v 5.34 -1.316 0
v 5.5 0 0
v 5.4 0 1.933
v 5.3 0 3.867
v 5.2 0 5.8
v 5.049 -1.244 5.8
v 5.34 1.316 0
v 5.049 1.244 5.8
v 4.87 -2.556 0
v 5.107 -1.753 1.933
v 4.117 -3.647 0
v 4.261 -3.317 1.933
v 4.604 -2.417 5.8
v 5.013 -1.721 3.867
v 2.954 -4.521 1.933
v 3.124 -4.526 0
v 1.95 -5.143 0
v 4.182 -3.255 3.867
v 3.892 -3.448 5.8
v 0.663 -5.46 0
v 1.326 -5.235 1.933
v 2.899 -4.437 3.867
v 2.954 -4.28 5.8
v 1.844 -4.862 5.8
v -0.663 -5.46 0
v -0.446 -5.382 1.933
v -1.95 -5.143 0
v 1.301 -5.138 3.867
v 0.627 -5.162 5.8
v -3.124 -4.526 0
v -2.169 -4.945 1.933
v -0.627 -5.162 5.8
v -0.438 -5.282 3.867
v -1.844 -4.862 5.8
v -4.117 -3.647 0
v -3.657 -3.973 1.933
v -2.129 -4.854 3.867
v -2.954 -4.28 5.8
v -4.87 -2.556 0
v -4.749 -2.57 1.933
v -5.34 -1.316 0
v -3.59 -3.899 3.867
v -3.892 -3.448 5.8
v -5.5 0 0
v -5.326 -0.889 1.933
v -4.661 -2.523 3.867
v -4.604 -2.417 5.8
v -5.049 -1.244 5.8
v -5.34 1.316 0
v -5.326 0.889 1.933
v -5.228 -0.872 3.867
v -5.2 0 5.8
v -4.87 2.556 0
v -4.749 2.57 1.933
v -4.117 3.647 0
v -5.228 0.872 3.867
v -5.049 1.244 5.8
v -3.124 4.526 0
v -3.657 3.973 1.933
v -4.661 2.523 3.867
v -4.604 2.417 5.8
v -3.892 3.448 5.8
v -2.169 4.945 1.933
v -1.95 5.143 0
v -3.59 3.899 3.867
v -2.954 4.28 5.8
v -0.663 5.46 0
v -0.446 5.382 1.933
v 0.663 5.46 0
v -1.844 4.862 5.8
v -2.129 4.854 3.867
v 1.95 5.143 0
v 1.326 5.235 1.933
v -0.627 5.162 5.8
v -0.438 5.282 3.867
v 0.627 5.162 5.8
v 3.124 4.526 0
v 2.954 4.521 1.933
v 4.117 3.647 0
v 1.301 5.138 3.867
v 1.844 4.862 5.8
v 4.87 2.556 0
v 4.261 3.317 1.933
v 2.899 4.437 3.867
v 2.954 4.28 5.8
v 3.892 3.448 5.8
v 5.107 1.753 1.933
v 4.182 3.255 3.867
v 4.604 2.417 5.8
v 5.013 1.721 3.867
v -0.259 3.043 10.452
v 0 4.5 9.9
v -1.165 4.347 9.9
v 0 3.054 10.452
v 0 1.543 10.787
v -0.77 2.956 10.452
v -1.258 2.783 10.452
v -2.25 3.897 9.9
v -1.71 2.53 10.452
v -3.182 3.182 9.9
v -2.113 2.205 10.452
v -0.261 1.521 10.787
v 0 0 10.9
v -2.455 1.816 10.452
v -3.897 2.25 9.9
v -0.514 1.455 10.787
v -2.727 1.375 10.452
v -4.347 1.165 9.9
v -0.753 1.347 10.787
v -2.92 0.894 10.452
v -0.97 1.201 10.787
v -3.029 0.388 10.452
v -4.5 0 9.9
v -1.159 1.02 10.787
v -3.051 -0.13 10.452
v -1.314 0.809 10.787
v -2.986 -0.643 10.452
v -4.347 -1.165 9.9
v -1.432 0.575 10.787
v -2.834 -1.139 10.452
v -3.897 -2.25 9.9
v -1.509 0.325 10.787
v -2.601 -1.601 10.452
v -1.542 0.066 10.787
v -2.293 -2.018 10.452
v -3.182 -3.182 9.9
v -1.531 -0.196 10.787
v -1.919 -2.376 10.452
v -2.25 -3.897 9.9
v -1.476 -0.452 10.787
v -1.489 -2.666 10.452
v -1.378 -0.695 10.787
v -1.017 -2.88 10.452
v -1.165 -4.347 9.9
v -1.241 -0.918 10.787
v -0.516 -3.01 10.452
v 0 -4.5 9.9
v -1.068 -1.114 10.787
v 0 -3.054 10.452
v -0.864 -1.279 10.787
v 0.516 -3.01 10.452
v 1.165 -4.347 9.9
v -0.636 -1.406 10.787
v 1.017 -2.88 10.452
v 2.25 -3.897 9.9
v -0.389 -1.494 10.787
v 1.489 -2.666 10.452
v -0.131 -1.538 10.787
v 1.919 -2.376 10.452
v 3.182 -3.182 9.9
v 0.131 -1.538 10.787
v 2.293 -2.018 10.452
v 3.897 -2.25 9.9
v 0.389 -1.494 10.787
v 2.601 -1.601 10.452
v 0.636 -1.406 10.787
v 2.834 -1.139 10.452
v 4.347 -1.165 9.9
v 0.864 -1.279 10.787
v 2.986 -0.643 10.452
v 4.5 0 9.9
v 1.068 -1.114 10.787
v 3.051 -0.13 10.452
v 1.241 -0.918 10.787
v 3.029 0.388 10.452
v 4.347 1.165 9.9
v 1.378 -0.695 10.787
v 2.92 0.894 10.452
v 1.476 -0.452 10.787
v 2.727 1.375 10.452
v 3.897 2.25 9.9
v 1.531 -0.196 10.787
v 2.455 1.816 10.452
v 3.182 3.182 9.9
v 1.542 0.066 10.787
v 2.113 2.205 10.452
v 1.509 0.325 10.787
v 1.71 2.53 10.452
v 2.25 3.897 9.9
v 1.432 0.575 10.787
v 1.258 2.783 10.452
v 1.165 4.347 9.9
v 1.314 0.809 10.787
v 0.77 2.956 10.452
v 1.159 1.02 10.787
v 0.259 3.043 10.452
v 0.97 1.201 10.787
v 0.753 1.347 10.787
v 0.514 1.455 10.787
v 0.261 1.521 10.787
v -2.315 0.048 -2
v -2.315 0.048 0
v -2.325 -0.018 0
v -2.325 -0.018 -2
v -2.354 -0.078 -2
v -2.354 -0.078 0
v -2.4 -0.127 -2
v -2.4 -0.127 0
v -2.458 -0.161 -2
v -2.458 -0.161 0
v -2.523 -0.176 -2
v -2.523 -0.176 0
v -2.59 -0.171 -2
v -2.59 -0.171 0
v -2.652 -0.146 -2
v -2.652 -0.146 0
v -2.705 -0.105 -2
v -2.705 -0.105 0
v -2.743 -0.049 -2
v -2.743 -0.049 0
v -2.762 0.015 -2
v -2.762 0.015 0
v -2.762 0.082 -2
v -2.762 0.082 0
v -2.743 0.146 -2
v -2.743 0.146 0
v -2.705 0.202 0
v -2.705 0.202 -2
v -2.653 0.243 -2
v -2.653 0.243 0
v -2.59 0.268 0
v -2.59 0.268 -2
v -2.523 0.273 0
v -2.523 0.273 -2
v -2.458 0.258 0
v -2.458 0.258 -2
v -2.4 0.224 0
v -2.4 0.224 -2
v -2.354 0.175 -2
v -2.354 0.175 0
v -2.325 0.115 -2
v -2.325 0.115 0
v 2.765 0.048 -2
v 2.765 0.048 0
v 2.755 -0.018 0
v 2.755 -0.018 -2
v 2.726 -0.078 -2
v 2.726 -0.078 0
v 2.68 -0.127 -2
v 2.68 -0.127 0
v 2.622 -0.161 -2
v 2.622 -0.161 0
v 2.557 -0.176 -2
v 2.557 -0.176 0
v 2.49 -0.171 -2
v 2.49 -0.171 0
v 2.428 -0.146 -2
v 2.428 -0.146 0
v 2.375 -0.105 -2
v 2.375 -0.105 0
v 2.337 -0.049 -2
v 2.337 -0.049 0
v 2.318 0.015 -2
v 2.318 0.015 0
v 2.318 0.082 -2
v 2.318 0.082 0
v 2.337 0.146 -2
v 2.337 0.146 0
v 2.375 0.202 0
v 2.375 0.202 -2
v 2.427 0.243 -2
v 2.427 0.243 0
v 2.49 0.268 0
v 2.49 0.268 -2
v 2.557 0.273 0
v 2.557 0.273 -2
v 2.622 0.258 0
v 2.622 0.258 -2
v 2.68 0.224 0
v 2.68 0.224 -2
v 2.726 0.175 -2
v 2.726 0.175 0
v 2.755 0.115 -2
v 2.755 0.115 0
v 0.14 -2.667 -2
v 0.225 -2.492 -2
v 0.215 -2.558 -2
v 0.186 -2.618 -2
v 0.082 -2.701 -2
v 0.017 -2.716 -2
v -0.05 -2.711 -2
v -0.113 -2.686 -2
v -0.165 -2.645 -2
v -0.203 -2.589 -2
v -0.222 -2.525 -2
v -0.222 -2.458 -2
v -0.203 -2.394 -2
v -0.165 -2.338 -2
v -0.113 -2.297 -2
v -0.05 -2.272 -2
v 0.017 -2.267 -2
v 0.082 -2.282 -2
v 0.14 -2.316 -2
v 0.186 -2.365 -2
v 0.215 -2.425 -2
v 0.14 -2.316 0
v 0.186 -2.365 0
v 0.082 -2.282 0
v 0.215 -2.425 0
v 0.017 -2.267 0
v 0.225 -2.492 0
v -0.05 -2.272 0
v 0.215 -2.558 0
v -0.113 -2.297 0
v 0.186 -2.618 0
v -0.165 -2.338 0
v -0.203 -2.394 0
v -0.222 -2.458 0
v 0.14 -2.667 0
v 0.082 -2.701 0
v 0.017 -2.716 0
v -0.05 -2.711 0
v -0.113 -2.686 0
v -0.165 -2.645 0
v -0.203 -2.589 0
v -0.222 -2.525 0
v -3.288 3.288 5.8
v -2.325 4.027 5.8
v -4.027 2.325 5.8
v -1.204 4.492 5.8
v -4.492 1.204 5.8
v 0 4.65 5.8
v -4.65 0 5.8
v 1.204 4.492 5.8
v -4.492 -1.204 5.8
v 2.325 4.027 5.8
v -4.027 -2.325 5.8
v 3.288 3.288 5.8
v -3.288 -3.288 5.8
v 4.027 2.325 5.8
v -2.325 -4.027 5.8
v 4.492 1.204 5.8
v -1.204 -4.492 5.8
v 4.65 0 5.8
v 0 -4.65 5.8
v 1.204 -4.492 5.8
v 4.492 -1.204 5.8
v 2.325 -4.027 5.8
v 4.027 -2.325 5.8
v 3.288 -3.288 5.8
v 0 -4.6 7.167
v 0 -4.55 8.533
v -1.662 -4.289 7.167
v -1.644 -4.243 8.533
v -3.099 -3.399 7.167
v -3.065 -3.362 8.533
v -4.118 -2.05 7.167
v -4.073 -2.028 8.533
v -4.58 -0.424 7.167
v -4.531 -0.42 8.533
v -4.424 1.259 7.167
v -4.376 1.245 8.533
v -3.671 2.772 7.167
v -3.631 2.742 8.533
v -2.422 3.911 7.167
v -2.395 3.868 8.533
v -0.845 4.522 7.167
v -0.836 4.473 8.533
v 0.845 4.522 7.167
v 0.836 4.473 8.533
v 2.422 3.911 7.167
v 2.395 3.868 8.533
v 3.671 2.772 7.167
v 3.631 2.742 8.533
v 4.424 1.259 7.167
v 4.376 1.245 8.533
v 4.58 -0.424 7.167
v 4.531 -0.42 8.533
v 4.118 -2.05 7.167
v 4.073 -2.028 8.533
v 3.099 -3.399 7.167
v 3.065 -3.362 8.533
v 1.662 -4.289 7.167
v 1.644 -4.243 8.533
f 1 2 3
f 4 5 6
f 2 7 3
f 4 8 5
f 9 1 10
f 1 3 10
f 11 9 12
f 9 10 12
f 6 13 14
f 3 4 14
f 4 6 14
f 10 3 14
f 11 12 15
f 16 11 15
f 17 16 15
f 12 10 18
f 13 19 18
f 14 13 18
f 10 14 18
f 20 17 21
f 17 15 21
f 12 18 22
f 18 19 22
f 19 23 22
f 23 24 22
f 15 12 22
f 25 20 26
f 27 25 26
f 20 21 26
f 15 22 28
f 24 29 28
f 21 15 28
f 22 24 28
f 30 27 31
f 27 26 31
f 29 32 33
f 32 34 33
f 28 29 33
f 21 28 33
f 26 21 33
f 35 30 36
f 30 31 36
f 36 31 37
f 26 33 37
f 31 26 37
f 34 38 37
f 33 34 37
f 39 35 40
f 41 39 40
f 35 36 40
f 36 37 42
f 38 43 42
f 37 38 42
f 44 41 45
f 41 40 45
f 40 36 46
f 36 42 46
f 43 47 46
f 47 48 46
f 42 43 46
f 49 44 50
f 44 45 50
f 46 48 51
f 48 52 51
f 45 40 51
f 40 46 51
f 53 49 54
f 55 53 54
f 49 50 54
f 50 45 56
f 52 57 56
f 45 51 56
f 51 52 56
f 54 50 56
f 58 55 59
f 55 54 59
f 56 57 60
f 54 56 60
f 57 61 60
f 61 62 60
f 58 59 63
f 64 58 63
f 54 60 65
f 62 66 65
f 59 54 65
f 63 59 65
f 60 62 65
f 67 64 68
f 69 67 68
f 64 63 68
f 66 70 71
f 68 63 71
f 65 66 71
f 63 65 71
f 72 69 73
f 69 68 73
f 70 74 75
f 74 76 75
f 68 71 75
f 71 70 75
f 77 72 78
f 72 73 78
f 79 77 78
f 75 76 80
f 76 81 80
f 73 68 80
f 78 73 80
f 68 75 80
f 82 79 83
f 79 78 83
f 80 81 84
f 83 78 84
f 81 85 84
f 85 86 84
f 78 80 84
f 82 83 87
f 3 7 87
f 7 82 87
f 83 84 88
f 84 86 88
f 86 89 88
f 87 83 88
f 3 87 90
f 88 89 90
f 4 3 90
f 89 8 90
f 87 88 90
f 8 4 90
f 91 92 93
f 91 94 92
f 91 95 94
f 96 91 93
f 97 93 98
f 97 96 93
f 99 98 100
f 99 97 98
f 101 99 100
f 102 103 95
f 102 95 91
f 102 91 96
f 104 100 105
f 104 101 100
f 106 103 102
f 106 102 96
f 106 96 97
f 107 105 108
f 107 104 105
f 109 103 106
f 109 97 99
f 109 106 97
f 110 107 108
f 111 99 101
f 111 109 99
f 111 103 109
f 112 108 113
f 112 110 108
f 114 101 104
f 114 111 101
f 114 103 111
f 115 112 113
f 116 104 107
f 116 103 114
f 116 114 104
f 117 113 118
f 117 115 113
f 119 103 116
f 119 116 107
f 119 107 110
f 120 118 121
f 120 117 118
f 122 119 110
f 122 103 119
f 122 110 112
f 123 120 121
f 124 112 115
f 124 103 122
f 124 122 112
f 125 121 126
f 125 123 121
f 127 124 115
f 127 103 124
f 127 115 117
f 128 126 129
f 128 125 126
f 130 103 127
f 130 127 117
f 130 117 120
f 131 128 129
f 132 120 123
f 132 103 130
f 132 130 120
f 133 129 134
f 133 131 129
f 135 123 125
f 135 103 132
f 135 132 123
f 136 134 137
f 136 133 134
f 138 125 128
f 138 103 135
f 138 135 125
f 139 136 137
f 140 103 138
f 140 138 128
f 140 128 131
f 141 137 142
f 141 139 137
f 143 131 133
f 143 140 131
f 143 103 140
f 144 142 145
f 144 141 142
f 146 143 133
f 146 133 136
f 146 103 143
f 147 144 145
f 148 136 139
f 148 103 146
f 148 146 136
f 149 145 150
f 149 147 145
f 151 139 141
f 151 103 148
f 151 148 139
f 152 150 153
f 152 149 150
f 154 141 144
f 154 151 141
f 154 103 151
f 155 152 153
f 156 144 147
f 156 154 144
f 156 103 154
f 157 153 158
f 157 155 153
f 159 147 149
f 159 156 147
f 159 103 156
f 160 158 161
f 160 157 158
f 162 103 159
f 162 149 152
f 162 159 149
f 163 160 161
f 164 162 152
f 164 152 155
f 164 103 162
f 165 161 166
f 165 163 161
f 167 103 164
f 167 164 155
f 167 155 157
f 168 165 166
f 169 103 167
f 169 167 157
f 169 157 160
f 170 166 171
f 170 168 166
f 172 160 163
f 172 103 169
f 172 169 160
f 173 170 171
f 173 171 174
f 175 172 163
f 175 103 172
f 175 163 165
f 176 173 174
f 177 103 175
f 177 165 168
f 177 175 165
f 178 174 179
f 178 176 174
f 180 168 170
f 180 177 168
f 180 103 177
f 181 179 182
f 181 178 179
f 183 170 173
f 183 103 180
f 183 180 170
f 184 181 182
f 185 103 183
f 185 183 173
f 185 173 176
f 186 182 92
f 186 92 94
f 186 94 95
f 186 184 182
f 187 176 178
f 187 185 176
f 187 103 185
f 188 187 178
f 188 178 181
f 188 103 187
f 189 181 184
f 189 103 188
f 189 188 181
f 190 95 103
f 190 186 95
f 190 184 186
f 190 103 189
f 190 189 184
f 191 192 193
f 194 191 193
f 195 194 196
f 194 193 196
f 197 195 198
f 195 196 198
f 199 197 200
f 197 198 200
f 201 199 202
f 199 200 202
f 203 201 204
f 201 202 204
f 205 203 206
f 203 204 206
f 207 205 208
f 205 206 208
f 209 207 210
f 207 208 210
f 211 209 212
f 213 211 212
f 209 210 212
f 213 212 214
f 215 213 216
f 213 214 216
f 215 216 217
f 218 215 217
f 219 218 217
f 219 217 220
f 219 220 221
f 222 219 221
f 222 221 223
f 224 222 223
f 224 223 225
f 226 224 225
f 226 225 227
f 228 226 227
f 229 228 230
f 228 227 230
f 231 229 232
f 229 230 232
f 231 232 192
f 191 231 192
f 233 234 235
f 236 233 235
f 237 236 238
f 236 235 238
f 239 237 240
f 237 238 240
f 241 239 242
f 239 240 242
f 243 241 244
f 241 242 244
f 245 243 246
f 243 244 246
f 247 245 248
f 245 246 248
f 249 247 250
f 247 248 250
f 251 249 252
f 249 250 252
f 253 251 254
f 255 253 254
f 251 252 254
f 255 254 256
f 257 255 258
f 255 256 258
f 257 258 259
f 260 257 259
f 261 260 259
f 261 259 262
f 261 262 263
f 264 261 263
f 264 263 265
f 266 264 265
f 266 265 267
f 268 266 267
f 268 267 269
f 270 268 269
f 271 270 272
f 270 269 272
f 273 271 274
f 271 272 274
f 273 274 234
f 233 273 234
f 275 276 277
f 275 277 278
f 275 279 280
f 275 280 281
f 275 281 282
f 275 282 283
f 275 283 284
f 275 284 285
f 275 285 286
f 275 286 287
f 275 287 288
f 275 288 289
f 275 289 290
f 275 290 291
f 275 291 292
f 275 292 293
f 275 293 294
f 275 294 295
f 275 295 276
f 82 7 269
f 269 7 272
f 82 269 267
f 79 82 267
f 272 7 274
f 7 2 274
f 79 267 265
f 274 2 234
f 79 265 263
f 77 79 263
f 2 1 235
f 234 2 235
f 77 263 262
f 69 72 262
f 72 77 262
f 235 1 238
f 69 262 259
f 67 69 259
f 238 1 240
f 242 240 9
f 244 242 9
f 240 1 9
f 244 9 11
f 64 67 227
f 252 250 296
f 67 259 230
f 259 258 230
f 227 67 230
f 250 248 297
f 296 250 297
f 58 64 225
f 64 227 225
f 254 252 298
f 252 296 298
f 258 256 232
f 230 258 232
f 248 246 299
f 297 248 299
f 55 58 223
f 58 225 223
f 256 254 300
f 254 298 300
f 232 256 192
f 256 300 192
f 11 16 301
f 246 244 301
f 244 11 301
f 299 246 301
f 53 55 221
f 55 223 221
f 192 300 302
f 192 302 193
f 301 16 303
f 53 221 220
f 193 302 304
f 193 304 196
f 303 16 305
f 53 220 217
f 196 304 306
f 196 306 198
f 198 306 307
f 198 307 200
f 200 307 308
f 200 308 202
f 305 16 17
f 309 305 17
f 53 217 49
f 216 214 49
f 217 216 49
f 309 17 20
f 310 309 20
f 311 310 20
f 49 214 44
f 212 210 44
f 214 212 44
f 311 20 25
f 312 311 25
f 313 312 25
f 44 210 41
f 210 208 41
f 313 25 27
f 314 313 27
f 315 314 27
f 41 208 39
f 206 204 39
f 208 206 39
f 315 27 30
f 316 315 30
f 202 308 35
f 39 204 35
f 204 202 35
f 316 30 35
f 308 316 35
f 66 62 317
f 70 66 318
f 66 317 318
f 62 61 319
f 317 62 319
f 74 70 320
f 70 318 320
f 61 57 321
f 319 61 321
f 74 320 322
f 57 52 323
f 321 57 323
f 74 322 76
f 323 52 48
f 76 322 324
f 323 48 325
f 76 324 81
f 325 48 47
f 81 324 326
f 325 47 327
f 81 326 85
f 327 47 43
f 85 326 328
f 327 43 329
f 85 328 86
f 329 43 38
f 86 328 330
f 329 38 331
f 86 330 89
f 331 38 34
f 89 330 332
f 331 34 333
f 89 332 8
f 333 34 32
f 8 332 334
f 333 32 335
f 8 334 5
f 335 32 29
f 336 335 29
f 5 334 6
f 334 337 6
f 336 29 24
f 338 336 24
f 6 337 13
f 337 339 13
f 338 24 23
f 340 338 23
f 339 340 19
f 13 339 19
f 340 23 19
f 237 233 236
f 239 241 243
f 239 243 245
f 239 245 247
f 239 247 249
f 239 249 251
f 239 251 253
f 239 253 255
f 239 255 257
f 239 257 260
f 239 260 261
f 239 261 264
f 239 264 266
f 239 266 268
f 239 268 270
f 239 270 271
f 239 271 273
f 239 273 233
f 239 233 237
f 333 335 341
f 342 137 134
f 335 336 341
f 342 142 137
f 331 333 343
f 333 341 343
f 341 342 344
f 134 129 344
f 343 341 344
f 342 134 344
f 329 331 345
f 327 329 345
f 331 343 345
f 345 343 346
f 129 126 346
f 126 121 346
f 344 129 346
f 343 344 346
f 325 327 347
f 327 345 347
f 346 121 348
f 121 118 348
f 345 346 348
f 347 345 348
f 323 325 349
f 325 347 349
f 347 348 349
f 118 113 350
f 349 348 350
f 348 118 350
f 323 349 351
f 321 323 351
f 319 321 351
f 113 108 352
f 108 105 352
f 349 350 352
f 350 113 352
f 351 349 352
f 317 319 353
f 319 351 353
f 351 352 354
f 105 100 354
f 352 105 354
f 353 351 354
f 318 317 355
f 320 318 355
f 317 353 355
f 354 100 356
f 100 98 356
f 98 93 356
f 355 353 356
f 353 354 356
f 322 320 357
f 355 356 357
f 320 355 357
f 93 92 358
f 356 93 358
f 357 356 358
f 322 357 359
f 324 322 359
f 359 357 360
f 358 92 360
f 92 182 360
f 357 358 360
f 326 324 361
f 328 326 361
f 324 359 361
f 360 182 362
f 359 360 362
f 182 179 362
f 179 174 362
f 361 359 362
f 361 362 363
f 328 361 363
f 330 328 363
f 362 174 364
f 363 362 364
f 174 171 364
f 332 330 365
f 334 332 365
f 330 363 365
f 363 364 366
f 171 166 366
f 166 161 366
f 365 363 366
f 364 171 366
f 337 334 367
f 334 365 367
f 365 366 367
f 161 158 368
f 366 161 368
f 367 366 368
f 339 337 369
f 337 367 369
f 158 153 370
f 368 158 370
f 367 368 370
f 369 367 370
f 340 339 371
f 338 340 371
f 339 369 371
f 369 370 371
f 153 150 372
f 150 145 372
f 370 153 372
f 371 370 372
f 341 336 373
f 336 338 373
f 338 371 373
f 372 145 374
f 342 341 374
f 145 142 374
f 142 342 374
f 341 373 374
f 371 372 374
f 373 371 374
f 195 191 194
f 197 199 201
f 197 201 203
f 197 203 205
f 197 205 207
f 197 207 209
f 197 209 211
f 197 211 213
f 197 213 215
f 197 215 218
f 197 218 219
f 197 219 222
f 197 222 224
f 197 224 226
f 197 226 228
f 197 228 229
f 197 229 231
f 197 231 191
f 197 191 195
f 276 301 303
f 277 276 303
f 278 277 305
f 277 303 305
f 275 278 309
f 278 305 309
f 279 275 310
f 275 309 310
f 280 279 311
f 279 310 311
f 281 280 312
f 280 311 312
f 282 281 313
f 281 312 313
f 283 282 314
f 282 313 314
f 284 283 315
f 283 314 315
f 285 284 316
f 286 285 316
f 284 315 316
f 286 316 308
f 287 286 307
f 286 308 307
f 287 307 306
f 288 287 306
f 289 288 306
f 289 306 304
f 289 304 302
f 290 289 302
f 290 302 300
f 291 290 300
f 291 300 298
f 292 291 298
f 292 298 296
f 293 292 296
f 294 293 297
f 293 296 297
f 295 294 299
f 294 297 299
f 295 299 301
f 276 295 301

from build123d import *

# Parameters (mm, degrees)
SKETCH7_R           = 0.225
BOSS_EXTRUDE1_DEPTH = 2


with BuildPart() as part:
    # Sketch3 → Revolve1 (revolve)
    with BuildSketch(Plane(origin=(0, 0, 0), x_dir=(0, 0, -1), z_dir=(1, 0, 0)), mode=Mode.PRIVATE) as revolve1_sk:
        Polygon((0, 0), (0, 5.5), (-5.8, 5.2), (-5.8, 0), align=None)
    revolve(revolve1_sk.sketch.rotate(Axis((0, 0, 5.8), (0, 0, -1)), 90), axis=Axis((0, 0, 5.8), (0, 0, -1)))

    # Sketch5 → Revolve2 (revolve)
    with BuildSketch(Plane(origin=(0, 0, 0), x_dir=(0, 0, -1), z_dir=(1, 0, 0)), mode=Mode.PRIVATE) as revolve2_sk:
        Polygon((-5.8, 4.65), (-9.9, 4.5), (-9.9, 0), (-5.8, 0), align=None)
    revolve(revolve2_sk.sketch.rotate(Axis((0, 0, 9.9), (0, 0, -1)), 180), axis=Axis((0, 0, 9.9), (0, 0, -1)))

    # Sketch6 → Revolve3 (revolve)
    with BuildSketch(Plane(origin=(0, 0, 0), x_dir=(0, 0, -1), z_dir=(1, 0, 0))):
        with BuildLine():
            Line((-10.9, 0), (-9.9, 0))
            Line((-9.9, 0), (-9.9, 4.5))
            ThreePointArc((-9.9, 4.5), (-10.646987514, 2.304886114), (-10.9, 0))
        make_face()
    revolve(axis=Axis((0, 0, 0), (0, 0, 1)))

    # Sketch7 → Boss-Extrude1 (add)
    with BuildSketch(Plane(origin=(0, 0, 0), x_dir=(-1, 0, 0), z_dir=(0, 0, -1))):
        with Locations(Location((2.54, 0.048471669, 0), (0, 0, 180))):
            Circle(SKETCH7_R)
        with Locations(Location((0, -2.491528331, 0), (0, 0, 180))):
            Circle(SKETCH7_R)
        with Locations(Location((-2.54, 0.048471669, 0), (0, 0, 180))):
            Circle(SKETCH7_R)
    extrude(amount=BOSS_EXTRUDE1_DEPTH)


solid = part.part
